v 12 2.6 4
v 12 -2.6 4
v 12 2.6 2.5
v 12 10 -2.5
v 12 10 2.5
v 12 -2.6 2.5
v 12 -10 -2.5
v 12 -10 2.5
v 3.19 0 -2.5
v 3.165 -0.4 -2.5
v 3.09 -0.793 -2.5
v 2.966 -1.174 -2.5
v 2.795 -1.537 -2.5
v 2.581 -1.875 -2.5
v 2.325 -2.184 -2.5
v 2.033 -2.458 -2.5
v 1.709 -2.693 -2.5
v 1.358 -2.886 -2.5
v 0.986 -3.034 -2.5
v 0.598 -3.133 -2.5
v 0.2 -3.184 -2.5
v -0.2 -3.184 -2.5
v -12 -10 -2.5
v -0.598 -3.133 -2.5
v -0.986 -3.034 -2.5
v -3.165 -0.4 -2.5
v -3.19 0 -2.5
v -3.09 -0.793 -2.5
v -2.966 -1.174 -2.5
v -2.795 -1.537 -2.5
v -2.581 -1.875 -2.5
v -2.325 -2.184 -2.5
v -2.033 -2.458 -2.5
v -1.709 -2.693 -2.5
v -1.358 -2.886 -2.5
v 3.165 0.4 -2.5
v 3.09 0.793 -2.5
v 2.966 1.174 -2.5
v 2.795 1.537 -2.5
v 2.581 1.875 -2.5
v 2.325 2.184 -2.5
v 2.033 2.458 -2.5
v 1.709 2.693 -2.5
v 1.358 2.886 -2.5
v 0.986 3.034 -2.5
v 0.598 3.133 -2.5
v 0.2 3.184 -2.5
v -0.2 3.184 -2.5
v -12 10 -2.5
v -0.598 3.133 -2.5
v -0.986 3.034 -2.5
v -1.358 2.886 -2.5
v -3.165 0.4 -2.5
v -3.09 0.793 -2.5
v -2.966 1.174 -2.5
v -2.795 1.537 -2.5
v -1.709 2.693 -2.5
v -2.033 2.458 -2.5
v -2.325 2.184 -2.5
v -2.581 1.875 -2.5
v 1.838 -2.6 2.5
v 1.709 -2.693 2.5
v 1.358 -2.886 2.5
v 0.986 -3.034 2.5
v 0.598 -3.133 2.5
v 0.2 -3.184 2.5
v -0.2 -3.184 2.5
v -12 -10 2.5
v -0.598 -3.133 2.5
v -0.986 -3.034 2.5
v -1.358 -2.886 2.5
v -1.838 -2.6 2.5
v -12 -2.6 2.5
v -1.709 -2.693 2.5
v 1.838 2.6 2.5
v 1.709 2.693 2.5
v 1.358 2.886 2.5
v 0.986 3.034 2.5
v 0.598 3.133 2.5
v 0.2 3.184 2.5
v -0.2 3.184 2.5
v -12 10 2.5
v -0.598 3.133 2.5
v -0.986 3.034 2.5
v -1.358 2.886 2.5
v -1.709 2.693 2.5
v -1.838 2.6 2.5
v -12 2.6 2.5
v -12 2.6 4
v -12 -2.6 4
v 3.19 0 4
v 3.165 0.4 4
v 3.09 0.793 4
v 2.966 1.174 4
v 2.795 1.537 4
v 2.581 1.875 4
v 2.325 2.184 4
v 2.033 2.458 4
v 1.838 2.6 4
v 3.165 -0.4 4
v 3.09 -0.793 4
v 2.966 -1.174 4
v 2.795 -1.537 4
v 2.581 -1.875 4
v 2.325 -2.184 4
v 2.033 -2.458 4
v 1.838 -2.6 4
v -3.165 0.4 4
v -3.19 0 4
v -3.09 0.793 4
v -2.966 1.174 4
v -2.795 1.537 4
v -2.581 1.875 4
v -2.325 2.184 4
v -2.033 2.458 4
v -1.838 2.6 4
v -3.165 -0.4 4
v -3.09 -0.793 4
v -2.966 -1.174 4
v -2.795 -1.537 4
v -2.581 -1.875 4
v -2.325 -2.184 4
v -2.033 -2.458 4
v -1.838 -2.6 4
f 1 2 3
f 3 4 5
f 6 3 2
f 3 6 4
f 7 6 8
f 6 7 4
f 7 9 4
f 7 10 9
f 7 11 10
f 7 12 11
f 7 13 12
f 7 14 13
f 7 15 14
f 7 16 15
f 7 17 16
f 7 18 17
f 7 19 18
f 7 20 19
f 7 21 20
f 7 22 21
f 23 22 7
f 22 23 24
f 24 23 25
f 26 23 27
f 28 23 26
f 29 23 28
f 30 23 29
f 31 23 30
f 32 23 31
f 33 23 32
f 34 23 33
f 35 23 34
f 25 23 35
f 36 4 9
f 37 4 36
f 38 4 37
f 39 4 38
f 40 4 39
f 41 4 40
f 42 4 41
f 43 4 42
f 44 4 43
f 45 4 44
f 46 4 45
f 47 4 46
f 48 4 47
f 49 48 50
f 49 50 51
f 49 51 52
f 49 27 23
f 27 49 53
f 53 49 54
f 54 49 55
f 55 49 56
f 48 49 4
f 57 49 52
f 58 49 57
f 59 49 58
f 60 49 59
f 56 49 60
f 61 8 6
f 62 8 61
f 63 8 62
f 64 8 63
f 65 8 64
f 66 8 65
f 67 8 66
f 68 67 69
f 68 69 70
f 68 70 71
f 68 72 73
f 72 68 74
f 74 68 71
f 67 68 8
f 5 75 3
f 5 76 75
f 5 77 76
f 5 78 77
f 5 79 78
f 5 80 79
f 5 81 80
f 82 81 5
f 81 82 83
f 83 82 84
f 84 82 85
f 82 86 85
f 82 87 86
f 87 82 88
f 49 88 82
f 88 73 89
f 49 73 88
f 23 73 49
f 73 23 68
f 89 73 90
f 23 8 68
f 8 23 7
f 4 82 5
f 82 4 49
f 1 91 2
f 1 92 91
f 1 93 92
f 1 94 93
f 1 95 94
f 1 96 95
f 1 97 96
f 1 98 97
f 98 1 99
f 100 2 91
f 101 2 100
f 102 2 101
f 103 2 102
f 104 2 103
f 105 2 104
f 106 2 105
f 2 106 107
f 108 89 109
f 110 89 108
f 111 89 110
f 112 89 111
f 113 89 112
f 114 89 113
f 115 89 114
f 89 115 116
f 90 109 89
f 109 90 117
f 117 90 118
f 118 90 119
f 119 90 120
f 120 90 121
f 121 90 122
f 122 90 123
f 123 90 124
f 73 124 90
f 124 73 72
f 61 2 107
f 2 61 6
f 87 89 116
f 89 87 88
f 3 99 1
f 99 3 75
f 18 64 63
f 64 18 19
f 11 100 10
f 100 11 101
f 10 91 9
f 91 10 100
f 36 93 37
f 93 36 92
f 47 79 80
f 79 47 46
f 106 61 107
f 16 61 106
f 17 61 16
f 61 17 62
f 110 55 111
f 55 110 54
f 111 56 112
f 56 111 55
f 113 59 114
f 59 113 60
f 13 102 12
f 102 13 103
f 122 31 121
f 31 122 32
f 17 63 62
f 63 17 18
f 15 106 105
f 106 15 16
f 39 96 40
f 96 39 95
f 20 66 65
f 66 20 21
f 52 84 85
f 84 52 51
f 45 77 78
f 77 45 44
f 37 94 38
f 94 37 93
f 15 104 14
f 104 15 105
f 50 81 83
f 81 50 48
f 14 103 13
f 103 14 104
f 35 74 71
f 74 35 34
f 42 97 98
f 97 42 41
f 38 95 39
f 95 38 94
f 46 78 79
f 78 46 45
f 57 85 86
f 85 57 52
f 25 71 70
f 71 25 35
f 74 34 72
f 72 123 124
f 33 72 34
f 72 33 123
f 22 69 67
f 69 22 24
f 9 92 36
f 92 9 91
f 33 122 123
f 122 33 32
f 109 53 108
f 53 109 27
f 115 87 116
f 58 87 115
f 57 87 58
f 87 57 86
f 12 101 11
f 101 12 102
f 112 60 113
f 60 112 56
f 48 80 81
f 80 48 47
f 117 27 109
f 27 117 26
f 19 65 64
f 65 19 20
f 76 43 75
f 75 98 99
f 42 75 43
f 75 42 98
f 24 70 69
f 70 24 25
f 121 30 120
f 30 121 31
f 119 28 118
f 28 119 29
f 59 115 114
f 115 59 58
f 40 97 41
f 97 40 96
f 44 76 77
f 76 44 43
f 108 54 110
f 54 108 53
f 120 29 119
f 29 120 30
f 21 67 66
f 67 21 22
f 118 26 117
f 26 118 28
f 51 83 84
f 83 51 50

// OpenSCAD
// M5 in M6 hole
big_hole_diam = 6.38;
small_hole_diam = 5.5;

// M6 in M6 hole
big_hole_diam = 6.38;
small_hole_diam = 6.38;

//thickness = 1.5;
thickness = 5;
length = 24;
width = 20;

spine_width = 5.2;
spine_height = 1.5;

module spacer() {
     difference() {
          union() {
               cube([length, width, thickness], center=true);
               if (big_hole_diam > small_hole_diam)
                    cylinder(r=big_hole_diam/2, h=thickness+2.5);

               // bottom "spine"
               if (spine_height > 0) {
                    translate([0,0,-spine_height/2 - thickness/2]) cube([length, spine_width, spine_height], center=true);
               }
          }
          cylinder(r=small_hole_diam/2, h=10*thickness, center=true);
     }
}

rotate([180,0,0]) spacer($fn=50);
